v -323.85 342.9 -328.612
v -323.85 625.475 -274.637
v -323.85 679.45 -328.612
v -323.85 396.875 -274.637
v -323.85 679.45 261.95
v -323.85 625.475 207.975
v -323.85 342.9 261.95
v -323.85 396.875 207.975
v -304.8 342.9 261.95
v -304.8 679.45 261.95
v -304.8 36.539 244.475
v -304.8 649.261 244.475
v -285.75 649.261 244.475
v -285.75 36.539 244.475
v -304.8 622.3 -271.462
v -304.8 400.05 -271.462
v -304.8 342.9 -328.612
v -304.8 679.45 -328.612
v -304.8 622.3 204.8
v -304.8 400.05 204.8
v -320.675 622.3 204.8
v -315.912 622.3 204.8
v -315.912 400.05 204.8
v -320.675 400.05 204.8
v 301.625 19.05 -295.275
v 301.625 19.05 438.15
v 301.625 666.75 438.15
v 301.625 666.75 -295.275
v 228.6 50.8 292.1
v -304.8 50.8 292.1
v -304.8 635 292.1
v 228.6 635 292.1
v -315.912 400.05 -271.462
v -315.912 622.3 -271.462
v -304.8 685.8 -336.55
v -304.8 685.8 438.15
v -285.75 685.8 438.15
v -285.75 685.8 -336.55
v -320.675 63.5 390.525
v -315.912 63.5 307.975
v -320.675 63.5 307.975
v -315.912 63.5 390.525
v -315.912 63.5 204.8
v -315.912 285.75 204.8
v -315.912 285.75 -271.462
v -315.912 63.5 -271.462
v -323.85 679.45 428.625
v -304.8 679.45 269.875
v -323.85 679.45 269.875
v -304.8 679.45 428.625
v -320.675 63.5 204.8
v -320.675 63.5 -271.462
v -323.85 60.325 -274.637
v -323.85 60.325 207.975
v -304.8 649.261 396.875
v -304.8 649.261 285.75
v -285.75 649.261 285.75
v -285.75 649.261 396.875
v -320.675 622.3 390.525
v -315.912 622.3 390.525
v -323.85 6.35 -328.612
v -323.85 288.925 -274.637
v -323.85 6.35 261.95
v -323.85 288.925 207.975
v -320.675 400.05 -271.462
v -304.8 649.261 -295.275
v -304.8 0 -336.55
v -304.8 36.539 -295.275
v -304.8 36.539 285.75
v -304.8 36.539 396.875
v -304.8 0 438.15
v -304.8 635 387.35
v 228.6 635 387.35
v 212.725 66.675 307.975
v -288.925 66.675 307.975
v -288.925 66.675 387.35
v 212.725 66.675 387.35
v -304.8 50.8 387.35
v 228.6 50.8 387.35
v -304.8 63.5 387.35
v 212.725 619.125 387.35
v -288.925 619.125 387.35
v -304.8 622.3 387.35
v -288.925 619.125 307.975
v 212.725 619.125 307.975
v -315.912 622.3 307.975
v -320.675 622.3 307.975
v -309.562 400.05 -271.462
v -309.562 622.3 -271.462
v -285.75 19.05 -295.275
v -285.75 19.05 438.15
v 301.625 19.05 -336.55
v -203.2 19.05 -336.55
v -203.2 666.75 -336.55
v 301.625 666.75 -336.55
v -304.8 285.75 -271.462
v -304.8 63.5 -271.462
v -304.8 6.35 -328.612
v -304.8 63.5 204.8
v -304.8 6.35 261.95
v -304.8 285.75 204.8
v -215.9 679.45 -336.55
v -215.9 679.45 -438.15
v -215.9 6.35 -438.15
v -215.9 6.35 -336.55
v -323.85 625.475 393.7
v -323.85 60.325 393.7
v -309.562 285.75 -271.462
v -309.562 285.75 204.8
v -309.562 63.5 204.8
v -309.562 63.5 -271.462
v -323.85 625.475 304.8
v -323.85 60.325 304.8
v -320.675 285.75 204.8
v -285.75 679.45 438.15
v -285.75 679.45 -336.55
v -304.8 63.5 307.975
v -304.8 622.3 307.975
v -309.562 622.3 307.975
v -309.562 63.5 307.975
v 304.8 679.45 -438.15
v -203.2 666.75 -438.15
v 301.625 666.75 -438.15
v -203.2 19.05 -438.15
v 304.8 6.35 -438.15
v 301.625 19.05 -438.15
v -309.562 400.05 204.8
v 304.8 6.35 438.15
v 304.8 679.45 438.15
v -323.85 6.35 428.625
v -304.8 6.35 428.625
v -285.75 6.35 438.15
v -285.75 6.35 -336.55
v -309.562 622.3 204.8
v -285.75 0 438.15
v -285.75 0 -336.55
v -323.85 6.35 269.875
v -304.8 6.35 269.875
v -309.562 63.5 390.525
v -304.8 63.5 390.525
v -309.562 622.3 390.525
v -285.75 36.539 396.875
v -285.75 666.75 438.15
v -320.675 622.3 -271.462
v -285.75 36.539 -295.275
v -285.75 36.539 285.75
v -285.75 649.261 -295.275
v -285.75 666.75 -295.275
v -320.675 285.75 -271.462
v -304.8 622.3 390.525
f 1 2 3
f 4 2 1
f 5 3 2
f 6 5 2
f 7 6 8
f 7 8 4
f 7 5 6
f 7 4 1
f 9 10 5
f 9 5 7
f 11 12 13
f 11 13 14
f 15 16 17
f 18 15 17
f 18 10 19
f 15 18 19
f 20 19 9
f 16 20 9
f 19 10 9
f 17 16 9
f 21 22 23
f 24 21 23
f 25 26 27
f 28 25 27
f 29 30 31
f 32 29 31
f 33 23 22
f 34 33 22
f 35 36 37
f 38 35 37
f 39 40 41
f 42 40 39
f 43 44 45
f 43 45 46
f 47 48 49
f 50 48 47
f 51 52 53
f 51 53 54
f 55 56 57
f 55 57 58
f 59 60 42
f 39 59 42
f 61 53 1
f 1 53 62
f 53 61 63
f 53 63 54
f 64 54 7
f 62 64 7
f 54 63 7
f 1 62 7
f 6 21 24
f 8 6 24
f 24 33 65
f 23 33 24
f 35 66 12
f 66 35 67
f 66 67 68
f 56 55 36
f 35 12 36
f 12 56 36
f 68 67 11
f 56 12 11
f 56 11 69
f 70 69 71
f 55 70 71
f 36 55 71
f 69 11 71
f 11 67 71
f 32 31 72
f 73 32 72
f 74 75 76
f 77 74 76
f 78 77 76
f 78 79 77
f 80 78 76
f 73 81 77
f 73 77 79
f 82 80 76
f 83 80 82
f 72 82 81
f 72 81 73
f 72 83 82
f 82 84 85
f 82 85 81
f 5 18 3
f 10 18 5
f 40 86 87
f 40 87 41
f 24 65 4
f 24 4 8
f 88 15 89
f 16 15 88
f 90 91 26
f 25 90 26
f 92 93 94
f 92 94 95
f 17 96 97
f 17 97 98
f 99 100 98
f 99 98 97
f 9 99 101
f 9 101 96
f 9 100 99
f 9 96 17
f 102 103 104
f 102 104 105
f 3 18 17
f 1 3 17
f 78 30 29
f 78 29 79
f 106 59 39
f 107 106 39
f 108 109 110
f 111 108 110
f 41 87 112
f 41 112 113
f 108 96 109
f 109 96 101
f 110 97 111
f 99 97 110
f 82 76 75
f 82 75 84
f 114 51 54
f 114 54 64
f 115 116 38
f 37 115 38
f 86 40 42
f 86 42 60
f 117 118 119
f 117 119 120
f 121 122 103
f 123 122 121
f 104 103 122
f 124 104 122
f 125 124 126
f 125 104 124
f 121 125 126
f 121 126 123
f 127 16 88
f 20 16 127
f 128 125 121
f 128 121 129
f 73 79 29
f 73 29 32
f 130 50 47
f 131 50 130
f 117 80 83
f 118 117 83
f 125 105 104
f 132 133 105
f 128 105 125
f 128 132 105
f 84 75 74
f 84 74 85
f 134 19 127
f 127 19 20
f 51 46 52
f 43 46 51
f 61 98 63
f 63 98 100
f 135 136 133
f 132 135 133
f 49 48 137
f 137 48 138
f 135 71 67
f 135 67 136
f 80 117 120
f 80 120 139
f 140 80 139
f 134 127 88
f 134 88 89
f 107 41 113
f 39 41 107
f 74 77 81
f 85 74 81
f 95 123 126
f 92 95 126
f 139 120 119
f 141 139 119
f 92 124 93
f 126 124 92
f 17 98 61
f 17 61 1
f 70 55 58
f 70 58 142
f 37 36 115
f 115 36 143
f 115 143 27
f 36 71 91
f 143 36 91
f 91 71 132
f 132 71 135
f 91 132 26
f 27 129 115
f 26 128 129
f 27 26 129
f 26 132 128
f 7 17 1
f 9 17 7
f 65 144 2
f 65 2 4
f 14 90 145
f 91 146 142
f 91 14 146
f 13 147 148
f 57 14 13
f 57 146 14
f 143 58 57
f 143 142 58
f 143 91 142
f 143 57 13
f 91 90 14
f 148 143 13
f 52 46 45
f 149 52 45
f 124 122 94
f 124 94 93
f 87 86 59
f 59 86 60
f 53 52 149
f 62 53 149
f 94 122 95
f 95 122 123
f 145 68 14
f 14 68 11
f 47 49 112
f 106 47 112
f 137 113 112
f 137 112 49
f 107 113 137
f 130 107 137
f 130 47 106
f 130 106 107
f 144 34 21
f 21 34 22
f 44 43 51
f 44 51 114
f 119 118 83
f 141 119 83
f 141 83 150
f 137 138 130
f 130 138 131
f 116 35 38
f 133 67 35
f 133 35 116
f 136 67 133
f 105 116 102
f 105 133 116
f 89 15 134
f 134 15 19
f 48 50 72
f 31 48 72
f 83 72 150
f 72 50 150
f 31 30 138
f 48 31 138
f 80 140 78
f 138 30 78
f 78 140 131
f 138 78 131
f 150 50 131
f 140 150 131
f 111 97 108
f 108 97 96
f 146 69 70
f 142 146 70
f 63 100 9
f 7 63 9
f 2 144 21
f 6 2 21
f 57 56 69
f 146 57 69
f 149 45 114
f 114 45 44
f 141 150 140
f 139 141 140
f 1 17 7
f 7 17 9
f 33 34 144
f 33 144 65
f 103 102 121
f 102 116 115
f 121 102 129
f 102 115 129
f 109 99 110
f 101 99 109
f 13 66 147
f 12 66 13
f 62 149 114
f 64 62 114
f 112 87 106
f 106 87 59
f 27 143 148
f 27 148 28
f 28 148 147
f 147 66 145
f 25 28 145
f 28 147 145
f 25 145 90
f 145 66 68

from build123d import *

# Parameters (mm, degrees)
F0_W          = 609.6
F0_H          = 876.3
F1_DEPTH      = 685.8
F2_W          = 88.9
F2_H          = 101.6
F3_DEPTH      = 685.801
F4_W          = 612.7229508197
F4_H          = 692.15
F5_DEPTH      = 19.05
F6_W          = 590.55
F6_H          = 6.35
F7_DEPTH      = 876.301
F8_W          = 587.375
F8_H          = 647.7
F9_DEPTH      = 733.425
F10_W         = 612.7229508197
F10_H         = 41.275
F11_DEPTH     = 19.05
F12_W         = 336.55
F12_H         = 590.5627
F12_W_2       = 222.25
F12_H_2       = 476.2627
F13_DEPTH     = 19.05
F14_W         = 6.35
F14_H         = 222.25
F15_DEPTH     = 476.2627
F16_SIZE      = 3.175
F17_W         = 673.1
F17_H         = 158.75
F17_W_2       = 558.8
F17_H_2       = 82.55
F18_DEPTH     = 19.05
F19_W         = 6.35
F19_H         = 558.8
F20_DEPTH     = 82.55
F21_SIZE      = 3.175
F22_W         = 504.825
F22_H         = 647.7
F23_DEPTH     = 101.6
F24_W         = 584.2
F24_H         = 95.25
F25_DEPTH     = 533.4
F26_T         = 15.875
F26_T3_DEPTH  = 37.249261314
F26_T5_DEPTH  = 37.249261314
F26_T7_DEPTH  = 37.249261314
F26_T9_DEPTH  = 37.249261314
F26_T11_DEPTH = 36.5125
F26_T13_DEPTH = 590.55
F26_T15_DEPTH = 114.3
F26_T17_DEPTH = 127
F26_T19_DEPTH = 615.95
F26_T21_DEPTH = 111.125
F26_T23_DEPTH = 36.5125


# Not quite as in the source:
# - a shell that OpenCascade refuses in one call is made with other operations: the cavity is built on its own and cut out


with BuildPart() as f1:
    # F0 (on Front) → F1 (new body)
    with BuildSketch(Plane.XZ):
        Rectangle(F0_W, F0_H)
    extrude(amount=-F1_DEPTH)

    # F2 (on face) → F3 (cut, through all)
    with BuildSketch(Plane.XZ):
        with Locations((-260.35, -387.35)):
            Rectangle(F2_W, F2_H)
    extrude(amount=-F3_DEPTH, mode=Mode.SUBTRACT)

    # F4 (on face) → F5 (cut)
    with BuildSketch(Plane(origin=(-304.8, 0, 0), x_dir=(0, -1, 0), z_dir=(-1, 0, 0))):
        with Locations((-342.9, 50.8)):
            Rectangle(F4_W, F4_H)
    extrude(amount=-F5_DEPTH, mode=Mode.SUBTRACT)

    # F6 (on face) → F7 (cut, through all)
    with BuildSketch(Plane.XY.offset(438.15)):
        with Locations((9.525, 682.625)):
            Rectangle(F6_W, F6_H)
        with Locations((9.525, 3.175)):
            Rectangle(F6_W, F6_H)
    extrude(amount=-F7_DEPTH, mode=Mode.SUBTRACT)

    # F8 (on face) → F9 (cut, through all)
    with BuildSketch(Plane.XY.offset(438.15)):
        with Locations((7.9375, 342.9)):
            Rectangle(F8_W, F8_H)
    extrude(amount=-F9_DEPTH, mode=Mode.SUBTRACT)

    # F10 (on face) → F11 (join, through all)
    with BuildSketch(Plane(origin=(-304.8, 0, 0), x_dir=(0, -1, 0), z_dir=(-1, 0, 0))):
        with Locations((-342.9, 265.1125)):
            Rectangle(F10_W, F10_H)
    extrude(amount=-F11_DEPTH)

    # F22 (on face) → F23 (cut)
    with BuildSketch(Plane(origin=(0, 0, -438.15), x_dir=(1, 0, 0), z_dir=(0, 0, -1))):
        with Locations((49.2125, -342.9)):
            Rectangle(F22_W, F22_H)
    extrude(amount=-F23_DEPTH, mode=Mode.SUBTRACT)


with BuildPart() as f13:
    # F12 (on face) → F13 (new body)
    with BuildSketch(Plane(origin=(-304.8, 0, 0), x_dir=(0, -1, 0), z_dir=(-1, 0, 0))):
        with Locations((-511.175, -33.33115)):
            Rectangle(F12_W, F12_H)
        with Locations((-511.175, -33.33115)):
            Rectangle(F12_W_2, F12_H_2, mode=Mode.SUBTRACT)
    extrude(amount=F13_DEPTH)

    # F14 (on face) → F15 (join, through all)
    with BuildSketch(Plane.XY.offset(-271.4625)):
        with Locations((-312.7375, 511.175)):
            Rectangle(F14_W, F14_H)
    extrude(amount=F15_DEPTH)

    # F16
    f16_edges = [f13.edges().sort_by_distance(p)[0] for p in [
        (-323.85, 622.3, -33.33115),
        (-323.85, 511.175, -271.4625),
        (-323.85, 400.05, -33.33115),
        (-323.85, 511.175, 204.8002),
    ]]
    chamfer(f16_edges, length=F16_SIZE)


with BuildPart() as f18:
    # F17 (on face) → F18 (new body)
    with BuildSketch(Plane(origin=(-304.8, 0, 0), x_dir=(0, -1, 0), z_dir=(-1, 0, 0))):
        with Locations((-342.9, 349.25)):
            Rectangle(F17_W, F17_H)
        with Locations((-342.9, 349.25)):
            Rectangle(F17_W_2, F17_H_2, mode=Mode.SUBTRACT)
    extrude(amount=F18_DEPTH)

    # F19 (on face) → F20 (join, through all)
    with BuildSketch(Plane.XY.offset(307.975)):
        with Locations((-312.7375, 342.9)):
            Rectangle(F19_W, F19_H)
    extrude(amount=F20_DEPTH)

    # F21
    f21_edges = [f18.edges().sort_by_distance(p)[0] for p in [
        (-323.85, 342.9, 307.975),
        (-323.85, 622.3, 349.25),
        (-323.85, 342.9, 390.525),
        (-323.85, 63.5, 349.25),
    ]]
    chamfer(f21_edges, length=F21_SIZE)

    # F24 (on face) → F25 (join)
    with BuildSketch(Plane.YZ.offset(-304.8)):
        with Locations((342.9, 339.725)):
            Rectangle(F24_W, F24_H)
    extrude(amount=F25_DEPTH)

    # F26: shell of thickness 15.875, made by hand


with BuildPart() as f26_core1:
    # F26_t2: copy of F18
    add(f18.part)

    # the walls: a layer under each face that stays
    f26_faces = [f26_core1.faces().sort_by_distance(p)[0] for p in [
        (-323.85, 567.2666666667, 296.3333333333),
        (-322.2625, 342.9, 306.3875),
        (-322.2625, 61.9125, 349.25),
        (-322.2625, 623.8875, 349.25),
        (-322.2625, 342.9, 392.1125),
        (-314.325, 342.9, 428.625),
        (-314.325, 679.45, 349.25),
        (-314.325, 342.9, 269.875),
        (-314.325, 6.35, 349.25),
        (-318.29375, 342.9, 307.975),
        (-318.29375, 63.5, 349.25),
        (-318.29375, 622.3, 349.25),
        (-318.29375, 342.9, 390.525),
        (-304.8, 567.2666666667, 402.1666666667),
        (-315.9125, 342.9, 349.25),
        (-38.1, 635, 339.725),
        (-38.1, 342.9, 292.1),
        (-38.1, 50.8, 339.725),
        (-307.18125, 63.5, 349.25),
        (-307.18125, 342.9, 390.525),
        (-307.18125, 622.3, 349.25),
        (-304.8, 342.9, 347.6625),
        (228.6, 342.9, 339.725),
        (-307.18125, 342.9, 307.975),
        (-309.5625, 342.9, 349.25),
    ]]
    thicken(f26_faces, amount=-F26_T, mode=Mode.SUBTRACT)

    # F26_s4 → F26_t3 (cut)
    with BuildSketch(Plane(origin=(4.5928978099, 4.5928978099, 4.5928978099), x_dir=(-0.7071067812, 0.7071067812, 0), z_dir=(0.5773502692, 0.5773502692, 0.5773502692))):
        Polygon((271.8908726623, 356.5892701441), (263.7152476623, 342.7036353262), (255.7777476623, 347.2863530879), (255.7777476623, 356.4517886113), align=None)
    extrude(amount=F26_T3_DEPTH, mode=Mode.SUBTRACT)

    # F26_s6 → F26_t5 (cut)
    with BuildSketch(Plane(origin=(-224.0071021901, 224.00710219, -224.0071021901), x_dir=(0.7071067812, 0.7071067812, 0), z_dir=(0.5773502692, -0.5773502692, 0.5773502692))):
        Polygon((213.0429578754, 636.5659477442), (221.2185828754, 622.6803129263), (229.1560828754, 627.263030688), (229.1560828754, 636.4284662114), align=None)
    extrude(amount=F26_T5_DEPTH, mode=Mode.SUBTRACT)

    # F26_s8 → F26_t7 (cut)
    with BuildSketch(Plane(origin=(-228.2404355234, -228.2404355234, 228.2404355234), x_dir=(-0.7071067812, 0.7071067812, 0), z_dir=(0.5773502692, 0.5773502692, -0.5773502692))):
        Polygon((271.8908726623, 213.7335916339), (255.7777476623, 213.8710731668), (255.7777476623, 223.0365086901), (263.7152476623, 227.6192264518), align=None)
    extrude(amount=F26_T7_DEPTH, mode=Mode.SUBTRACT)

    # F26_s10 → F26_t9 (cut)
    with BuildSketch(Plane(origin=(-456.8404355234, 456.8404355234, 456.8404355234), x_dir=(0.7071067812, 0.7071067812, 0), z_dir=(0.5773502692, -0.5773502692, -0.5773502692))):
        Polygon((213.0429578754, -66.2430859662), (229.1560828754, -66.1056044334), (229.1560828754, -56.94016891), (221.2185828754, -52.3574511483), align=None)
    extrude(amount=F26_T9_DEPTH, mode=Mode.SUBTRACT)

    # F26_s12 → F26_t11 (cut)
    with BuildSketch(Plane.YZ.offset(-336.55)):
        Polygon((622.14125, 308.13375), (622.3, 292.1), (638.175, 292.1), (638.175, 307.975), align=None)
        Polygon((63.65875, 308.13375), (63.5, 292.1), (47.625, 292.1), (47.625, 307.975), align=None)
        Polygon((63.65875, 390.36625), (47.625, 390.525), (47.625, 406.4), (63.5, 406.4), align=None)
        Polygon((622.14125, 390.36625), (638.175, 390.525), (638.175, 406.4), (622.3, 406.4), align=None)
    extrude(amount=F26_T11_DEPTH, mode=Mode.SUBTRACT)

    # F26_s14 → F26_t13 (cut)
    with BuildSketch(Plane.XZ.offset(-638.175)):
        Polygon((-316.07125, 308.13375), (-315.9125, 292.1), (-300.0375, 292.1), (-300.0375, 307.975), align=None)
        Polygon((-316.07125, 390.36625), (-315.9125, 406.4), (-300.0375, 406.4), (-300.0375, 390.525), align=None)
        Polygon((-309.40375, 390.36625), (-309.5625, 406.4), (-325.4375, 406.4), (-325.4375, 390.525), align=None)
        Polygon((-304.95875, 308.13375), (-288.925, 307.975), (-288.925, 292.1), (-304.8, 292.1), align=None)
        Polygon((-309.40375, 308.13375), (-309.5625, 292.1), (-325.4375, 292.1), (-325.4375, 307.975), align=None)
    extrude(amount=F26_T13_DEPTH, mode=Mode.SUBTRACT)

    # F26_s16 → F26_t15 (cut)
    with BuildSketch(Plane.XY.offset(292.1)):
        Polygon((-316.07125, 63.65875), (-315.9125, 47.625), (-300.0375, 47.625), (-300.0375, 63.5), align=None)
        Polygon((-316.07125, 622.14125), (-315.9125, 638.175), (-300.0375, 638.175), (-300.0375, 622.3), align=None)
        Polygon((-309.40375, 63.65875), (-309.5625, 47.625), (-325.4375, 47.625), (-325.4375, 63.5), align=None)
        Polygon((-309.40375, 622.14125), (-309.5625, 638.175), (-325.4375, 638.175), (-325.4375, 622.3), align=None)
    extrude(amount=F26_T15_DEPTH, mode=Mode.SUBTRACT)

    # F26_s18 → F26_t17 (cut)
    with BuildSketch(Plane.XY.offset(276.225)):
        Polygon((-304.64125, 635.15875), (-320.675, 635), (-320.675, 619.125), (-304.8, 619.125), align=None)
        Polygon((-304.64125, 50.64125), (-320.675, 50.8), (-320.675, 66.675), (-304.8, 66.675), align=None)
    extrude(amount=F26_T17_DEPTH, mode=Mode.SUBTRACT)

    # F26_s20 → F26_t19 (cut)
    with BuildSketch(Plane.XZ.offset(-650.875)):
        Polygon((-304.64125, 291.94125), (-320.675, 292.1), (-320.675, 307.975), (-304.8, 307.975), align=None)
    extrude(amount=F26_T19_DEPTH, mode=Mode.SUBTRACT)

    # F26_s22 → F26_t21 (cut)
    with BuildSketch(Plane.XY.offset(292.1)):
        Polygon((-304.95875, 63.65875), (-304.8, 47.625), (-288.925, 47.625), (-288.925, 63.5), align=None)
        Polygon((-304.95875, 622.14125), (-304.8, 638.175), (-288.925, 638.175), (-288.925, 622.3), align=None)
    extrude(amount=F26_T21_DEPTH, mode=Mode.SUBTRACT)

    # F26_s24 → F26_t23 (cut)
    with BuildSketch(Plane.YZ.offset(-325.4375)):
        Polygon((63.65875, 308.13375), (47.625, 307.975), (47.625, 292.1), (63.5, 292.1), align=None)
        Polygon((63.65875, 390.36625), (47.625, 390.525), (47.625, 406.4), (63.5, 406.4), align=None)
        Polygon((622.14125, 390.36625), (622.3, 406.4), (638.175, 406.4), (638.175, 390.525), align=None)
        Polygon((622.14125, 308.13375), (638.175, 307.975), (638.175, 292.1), (622.3, 292.1), align=None)
    extrude(amount=F26_T23_DEPTH, mode=Mode.SUBTRACT)


with BuildPart() as f18_1:
    add(f18.part)

    # what is left inside the walls is the cavity
    f26_cavity = [f26_core1.part.solids().sort_by_distance(p)[0] for p in [
        (45.508333, 342.9, 308.13375),
    ]]
    add(f26_cavity, mode=Mode.SUBTRACT)


with BuildPart() as f27_1:
    # F27: instance of F13
    add(f13.part.mirror(Plane(origin=(-314.325, 342.9, -33.33115), x_dir=(1, 0, 0), z_dir=(0, -1, 0))))


solid = Compound([f1.part, f13.part, f18_1.part, f27_1.part])
